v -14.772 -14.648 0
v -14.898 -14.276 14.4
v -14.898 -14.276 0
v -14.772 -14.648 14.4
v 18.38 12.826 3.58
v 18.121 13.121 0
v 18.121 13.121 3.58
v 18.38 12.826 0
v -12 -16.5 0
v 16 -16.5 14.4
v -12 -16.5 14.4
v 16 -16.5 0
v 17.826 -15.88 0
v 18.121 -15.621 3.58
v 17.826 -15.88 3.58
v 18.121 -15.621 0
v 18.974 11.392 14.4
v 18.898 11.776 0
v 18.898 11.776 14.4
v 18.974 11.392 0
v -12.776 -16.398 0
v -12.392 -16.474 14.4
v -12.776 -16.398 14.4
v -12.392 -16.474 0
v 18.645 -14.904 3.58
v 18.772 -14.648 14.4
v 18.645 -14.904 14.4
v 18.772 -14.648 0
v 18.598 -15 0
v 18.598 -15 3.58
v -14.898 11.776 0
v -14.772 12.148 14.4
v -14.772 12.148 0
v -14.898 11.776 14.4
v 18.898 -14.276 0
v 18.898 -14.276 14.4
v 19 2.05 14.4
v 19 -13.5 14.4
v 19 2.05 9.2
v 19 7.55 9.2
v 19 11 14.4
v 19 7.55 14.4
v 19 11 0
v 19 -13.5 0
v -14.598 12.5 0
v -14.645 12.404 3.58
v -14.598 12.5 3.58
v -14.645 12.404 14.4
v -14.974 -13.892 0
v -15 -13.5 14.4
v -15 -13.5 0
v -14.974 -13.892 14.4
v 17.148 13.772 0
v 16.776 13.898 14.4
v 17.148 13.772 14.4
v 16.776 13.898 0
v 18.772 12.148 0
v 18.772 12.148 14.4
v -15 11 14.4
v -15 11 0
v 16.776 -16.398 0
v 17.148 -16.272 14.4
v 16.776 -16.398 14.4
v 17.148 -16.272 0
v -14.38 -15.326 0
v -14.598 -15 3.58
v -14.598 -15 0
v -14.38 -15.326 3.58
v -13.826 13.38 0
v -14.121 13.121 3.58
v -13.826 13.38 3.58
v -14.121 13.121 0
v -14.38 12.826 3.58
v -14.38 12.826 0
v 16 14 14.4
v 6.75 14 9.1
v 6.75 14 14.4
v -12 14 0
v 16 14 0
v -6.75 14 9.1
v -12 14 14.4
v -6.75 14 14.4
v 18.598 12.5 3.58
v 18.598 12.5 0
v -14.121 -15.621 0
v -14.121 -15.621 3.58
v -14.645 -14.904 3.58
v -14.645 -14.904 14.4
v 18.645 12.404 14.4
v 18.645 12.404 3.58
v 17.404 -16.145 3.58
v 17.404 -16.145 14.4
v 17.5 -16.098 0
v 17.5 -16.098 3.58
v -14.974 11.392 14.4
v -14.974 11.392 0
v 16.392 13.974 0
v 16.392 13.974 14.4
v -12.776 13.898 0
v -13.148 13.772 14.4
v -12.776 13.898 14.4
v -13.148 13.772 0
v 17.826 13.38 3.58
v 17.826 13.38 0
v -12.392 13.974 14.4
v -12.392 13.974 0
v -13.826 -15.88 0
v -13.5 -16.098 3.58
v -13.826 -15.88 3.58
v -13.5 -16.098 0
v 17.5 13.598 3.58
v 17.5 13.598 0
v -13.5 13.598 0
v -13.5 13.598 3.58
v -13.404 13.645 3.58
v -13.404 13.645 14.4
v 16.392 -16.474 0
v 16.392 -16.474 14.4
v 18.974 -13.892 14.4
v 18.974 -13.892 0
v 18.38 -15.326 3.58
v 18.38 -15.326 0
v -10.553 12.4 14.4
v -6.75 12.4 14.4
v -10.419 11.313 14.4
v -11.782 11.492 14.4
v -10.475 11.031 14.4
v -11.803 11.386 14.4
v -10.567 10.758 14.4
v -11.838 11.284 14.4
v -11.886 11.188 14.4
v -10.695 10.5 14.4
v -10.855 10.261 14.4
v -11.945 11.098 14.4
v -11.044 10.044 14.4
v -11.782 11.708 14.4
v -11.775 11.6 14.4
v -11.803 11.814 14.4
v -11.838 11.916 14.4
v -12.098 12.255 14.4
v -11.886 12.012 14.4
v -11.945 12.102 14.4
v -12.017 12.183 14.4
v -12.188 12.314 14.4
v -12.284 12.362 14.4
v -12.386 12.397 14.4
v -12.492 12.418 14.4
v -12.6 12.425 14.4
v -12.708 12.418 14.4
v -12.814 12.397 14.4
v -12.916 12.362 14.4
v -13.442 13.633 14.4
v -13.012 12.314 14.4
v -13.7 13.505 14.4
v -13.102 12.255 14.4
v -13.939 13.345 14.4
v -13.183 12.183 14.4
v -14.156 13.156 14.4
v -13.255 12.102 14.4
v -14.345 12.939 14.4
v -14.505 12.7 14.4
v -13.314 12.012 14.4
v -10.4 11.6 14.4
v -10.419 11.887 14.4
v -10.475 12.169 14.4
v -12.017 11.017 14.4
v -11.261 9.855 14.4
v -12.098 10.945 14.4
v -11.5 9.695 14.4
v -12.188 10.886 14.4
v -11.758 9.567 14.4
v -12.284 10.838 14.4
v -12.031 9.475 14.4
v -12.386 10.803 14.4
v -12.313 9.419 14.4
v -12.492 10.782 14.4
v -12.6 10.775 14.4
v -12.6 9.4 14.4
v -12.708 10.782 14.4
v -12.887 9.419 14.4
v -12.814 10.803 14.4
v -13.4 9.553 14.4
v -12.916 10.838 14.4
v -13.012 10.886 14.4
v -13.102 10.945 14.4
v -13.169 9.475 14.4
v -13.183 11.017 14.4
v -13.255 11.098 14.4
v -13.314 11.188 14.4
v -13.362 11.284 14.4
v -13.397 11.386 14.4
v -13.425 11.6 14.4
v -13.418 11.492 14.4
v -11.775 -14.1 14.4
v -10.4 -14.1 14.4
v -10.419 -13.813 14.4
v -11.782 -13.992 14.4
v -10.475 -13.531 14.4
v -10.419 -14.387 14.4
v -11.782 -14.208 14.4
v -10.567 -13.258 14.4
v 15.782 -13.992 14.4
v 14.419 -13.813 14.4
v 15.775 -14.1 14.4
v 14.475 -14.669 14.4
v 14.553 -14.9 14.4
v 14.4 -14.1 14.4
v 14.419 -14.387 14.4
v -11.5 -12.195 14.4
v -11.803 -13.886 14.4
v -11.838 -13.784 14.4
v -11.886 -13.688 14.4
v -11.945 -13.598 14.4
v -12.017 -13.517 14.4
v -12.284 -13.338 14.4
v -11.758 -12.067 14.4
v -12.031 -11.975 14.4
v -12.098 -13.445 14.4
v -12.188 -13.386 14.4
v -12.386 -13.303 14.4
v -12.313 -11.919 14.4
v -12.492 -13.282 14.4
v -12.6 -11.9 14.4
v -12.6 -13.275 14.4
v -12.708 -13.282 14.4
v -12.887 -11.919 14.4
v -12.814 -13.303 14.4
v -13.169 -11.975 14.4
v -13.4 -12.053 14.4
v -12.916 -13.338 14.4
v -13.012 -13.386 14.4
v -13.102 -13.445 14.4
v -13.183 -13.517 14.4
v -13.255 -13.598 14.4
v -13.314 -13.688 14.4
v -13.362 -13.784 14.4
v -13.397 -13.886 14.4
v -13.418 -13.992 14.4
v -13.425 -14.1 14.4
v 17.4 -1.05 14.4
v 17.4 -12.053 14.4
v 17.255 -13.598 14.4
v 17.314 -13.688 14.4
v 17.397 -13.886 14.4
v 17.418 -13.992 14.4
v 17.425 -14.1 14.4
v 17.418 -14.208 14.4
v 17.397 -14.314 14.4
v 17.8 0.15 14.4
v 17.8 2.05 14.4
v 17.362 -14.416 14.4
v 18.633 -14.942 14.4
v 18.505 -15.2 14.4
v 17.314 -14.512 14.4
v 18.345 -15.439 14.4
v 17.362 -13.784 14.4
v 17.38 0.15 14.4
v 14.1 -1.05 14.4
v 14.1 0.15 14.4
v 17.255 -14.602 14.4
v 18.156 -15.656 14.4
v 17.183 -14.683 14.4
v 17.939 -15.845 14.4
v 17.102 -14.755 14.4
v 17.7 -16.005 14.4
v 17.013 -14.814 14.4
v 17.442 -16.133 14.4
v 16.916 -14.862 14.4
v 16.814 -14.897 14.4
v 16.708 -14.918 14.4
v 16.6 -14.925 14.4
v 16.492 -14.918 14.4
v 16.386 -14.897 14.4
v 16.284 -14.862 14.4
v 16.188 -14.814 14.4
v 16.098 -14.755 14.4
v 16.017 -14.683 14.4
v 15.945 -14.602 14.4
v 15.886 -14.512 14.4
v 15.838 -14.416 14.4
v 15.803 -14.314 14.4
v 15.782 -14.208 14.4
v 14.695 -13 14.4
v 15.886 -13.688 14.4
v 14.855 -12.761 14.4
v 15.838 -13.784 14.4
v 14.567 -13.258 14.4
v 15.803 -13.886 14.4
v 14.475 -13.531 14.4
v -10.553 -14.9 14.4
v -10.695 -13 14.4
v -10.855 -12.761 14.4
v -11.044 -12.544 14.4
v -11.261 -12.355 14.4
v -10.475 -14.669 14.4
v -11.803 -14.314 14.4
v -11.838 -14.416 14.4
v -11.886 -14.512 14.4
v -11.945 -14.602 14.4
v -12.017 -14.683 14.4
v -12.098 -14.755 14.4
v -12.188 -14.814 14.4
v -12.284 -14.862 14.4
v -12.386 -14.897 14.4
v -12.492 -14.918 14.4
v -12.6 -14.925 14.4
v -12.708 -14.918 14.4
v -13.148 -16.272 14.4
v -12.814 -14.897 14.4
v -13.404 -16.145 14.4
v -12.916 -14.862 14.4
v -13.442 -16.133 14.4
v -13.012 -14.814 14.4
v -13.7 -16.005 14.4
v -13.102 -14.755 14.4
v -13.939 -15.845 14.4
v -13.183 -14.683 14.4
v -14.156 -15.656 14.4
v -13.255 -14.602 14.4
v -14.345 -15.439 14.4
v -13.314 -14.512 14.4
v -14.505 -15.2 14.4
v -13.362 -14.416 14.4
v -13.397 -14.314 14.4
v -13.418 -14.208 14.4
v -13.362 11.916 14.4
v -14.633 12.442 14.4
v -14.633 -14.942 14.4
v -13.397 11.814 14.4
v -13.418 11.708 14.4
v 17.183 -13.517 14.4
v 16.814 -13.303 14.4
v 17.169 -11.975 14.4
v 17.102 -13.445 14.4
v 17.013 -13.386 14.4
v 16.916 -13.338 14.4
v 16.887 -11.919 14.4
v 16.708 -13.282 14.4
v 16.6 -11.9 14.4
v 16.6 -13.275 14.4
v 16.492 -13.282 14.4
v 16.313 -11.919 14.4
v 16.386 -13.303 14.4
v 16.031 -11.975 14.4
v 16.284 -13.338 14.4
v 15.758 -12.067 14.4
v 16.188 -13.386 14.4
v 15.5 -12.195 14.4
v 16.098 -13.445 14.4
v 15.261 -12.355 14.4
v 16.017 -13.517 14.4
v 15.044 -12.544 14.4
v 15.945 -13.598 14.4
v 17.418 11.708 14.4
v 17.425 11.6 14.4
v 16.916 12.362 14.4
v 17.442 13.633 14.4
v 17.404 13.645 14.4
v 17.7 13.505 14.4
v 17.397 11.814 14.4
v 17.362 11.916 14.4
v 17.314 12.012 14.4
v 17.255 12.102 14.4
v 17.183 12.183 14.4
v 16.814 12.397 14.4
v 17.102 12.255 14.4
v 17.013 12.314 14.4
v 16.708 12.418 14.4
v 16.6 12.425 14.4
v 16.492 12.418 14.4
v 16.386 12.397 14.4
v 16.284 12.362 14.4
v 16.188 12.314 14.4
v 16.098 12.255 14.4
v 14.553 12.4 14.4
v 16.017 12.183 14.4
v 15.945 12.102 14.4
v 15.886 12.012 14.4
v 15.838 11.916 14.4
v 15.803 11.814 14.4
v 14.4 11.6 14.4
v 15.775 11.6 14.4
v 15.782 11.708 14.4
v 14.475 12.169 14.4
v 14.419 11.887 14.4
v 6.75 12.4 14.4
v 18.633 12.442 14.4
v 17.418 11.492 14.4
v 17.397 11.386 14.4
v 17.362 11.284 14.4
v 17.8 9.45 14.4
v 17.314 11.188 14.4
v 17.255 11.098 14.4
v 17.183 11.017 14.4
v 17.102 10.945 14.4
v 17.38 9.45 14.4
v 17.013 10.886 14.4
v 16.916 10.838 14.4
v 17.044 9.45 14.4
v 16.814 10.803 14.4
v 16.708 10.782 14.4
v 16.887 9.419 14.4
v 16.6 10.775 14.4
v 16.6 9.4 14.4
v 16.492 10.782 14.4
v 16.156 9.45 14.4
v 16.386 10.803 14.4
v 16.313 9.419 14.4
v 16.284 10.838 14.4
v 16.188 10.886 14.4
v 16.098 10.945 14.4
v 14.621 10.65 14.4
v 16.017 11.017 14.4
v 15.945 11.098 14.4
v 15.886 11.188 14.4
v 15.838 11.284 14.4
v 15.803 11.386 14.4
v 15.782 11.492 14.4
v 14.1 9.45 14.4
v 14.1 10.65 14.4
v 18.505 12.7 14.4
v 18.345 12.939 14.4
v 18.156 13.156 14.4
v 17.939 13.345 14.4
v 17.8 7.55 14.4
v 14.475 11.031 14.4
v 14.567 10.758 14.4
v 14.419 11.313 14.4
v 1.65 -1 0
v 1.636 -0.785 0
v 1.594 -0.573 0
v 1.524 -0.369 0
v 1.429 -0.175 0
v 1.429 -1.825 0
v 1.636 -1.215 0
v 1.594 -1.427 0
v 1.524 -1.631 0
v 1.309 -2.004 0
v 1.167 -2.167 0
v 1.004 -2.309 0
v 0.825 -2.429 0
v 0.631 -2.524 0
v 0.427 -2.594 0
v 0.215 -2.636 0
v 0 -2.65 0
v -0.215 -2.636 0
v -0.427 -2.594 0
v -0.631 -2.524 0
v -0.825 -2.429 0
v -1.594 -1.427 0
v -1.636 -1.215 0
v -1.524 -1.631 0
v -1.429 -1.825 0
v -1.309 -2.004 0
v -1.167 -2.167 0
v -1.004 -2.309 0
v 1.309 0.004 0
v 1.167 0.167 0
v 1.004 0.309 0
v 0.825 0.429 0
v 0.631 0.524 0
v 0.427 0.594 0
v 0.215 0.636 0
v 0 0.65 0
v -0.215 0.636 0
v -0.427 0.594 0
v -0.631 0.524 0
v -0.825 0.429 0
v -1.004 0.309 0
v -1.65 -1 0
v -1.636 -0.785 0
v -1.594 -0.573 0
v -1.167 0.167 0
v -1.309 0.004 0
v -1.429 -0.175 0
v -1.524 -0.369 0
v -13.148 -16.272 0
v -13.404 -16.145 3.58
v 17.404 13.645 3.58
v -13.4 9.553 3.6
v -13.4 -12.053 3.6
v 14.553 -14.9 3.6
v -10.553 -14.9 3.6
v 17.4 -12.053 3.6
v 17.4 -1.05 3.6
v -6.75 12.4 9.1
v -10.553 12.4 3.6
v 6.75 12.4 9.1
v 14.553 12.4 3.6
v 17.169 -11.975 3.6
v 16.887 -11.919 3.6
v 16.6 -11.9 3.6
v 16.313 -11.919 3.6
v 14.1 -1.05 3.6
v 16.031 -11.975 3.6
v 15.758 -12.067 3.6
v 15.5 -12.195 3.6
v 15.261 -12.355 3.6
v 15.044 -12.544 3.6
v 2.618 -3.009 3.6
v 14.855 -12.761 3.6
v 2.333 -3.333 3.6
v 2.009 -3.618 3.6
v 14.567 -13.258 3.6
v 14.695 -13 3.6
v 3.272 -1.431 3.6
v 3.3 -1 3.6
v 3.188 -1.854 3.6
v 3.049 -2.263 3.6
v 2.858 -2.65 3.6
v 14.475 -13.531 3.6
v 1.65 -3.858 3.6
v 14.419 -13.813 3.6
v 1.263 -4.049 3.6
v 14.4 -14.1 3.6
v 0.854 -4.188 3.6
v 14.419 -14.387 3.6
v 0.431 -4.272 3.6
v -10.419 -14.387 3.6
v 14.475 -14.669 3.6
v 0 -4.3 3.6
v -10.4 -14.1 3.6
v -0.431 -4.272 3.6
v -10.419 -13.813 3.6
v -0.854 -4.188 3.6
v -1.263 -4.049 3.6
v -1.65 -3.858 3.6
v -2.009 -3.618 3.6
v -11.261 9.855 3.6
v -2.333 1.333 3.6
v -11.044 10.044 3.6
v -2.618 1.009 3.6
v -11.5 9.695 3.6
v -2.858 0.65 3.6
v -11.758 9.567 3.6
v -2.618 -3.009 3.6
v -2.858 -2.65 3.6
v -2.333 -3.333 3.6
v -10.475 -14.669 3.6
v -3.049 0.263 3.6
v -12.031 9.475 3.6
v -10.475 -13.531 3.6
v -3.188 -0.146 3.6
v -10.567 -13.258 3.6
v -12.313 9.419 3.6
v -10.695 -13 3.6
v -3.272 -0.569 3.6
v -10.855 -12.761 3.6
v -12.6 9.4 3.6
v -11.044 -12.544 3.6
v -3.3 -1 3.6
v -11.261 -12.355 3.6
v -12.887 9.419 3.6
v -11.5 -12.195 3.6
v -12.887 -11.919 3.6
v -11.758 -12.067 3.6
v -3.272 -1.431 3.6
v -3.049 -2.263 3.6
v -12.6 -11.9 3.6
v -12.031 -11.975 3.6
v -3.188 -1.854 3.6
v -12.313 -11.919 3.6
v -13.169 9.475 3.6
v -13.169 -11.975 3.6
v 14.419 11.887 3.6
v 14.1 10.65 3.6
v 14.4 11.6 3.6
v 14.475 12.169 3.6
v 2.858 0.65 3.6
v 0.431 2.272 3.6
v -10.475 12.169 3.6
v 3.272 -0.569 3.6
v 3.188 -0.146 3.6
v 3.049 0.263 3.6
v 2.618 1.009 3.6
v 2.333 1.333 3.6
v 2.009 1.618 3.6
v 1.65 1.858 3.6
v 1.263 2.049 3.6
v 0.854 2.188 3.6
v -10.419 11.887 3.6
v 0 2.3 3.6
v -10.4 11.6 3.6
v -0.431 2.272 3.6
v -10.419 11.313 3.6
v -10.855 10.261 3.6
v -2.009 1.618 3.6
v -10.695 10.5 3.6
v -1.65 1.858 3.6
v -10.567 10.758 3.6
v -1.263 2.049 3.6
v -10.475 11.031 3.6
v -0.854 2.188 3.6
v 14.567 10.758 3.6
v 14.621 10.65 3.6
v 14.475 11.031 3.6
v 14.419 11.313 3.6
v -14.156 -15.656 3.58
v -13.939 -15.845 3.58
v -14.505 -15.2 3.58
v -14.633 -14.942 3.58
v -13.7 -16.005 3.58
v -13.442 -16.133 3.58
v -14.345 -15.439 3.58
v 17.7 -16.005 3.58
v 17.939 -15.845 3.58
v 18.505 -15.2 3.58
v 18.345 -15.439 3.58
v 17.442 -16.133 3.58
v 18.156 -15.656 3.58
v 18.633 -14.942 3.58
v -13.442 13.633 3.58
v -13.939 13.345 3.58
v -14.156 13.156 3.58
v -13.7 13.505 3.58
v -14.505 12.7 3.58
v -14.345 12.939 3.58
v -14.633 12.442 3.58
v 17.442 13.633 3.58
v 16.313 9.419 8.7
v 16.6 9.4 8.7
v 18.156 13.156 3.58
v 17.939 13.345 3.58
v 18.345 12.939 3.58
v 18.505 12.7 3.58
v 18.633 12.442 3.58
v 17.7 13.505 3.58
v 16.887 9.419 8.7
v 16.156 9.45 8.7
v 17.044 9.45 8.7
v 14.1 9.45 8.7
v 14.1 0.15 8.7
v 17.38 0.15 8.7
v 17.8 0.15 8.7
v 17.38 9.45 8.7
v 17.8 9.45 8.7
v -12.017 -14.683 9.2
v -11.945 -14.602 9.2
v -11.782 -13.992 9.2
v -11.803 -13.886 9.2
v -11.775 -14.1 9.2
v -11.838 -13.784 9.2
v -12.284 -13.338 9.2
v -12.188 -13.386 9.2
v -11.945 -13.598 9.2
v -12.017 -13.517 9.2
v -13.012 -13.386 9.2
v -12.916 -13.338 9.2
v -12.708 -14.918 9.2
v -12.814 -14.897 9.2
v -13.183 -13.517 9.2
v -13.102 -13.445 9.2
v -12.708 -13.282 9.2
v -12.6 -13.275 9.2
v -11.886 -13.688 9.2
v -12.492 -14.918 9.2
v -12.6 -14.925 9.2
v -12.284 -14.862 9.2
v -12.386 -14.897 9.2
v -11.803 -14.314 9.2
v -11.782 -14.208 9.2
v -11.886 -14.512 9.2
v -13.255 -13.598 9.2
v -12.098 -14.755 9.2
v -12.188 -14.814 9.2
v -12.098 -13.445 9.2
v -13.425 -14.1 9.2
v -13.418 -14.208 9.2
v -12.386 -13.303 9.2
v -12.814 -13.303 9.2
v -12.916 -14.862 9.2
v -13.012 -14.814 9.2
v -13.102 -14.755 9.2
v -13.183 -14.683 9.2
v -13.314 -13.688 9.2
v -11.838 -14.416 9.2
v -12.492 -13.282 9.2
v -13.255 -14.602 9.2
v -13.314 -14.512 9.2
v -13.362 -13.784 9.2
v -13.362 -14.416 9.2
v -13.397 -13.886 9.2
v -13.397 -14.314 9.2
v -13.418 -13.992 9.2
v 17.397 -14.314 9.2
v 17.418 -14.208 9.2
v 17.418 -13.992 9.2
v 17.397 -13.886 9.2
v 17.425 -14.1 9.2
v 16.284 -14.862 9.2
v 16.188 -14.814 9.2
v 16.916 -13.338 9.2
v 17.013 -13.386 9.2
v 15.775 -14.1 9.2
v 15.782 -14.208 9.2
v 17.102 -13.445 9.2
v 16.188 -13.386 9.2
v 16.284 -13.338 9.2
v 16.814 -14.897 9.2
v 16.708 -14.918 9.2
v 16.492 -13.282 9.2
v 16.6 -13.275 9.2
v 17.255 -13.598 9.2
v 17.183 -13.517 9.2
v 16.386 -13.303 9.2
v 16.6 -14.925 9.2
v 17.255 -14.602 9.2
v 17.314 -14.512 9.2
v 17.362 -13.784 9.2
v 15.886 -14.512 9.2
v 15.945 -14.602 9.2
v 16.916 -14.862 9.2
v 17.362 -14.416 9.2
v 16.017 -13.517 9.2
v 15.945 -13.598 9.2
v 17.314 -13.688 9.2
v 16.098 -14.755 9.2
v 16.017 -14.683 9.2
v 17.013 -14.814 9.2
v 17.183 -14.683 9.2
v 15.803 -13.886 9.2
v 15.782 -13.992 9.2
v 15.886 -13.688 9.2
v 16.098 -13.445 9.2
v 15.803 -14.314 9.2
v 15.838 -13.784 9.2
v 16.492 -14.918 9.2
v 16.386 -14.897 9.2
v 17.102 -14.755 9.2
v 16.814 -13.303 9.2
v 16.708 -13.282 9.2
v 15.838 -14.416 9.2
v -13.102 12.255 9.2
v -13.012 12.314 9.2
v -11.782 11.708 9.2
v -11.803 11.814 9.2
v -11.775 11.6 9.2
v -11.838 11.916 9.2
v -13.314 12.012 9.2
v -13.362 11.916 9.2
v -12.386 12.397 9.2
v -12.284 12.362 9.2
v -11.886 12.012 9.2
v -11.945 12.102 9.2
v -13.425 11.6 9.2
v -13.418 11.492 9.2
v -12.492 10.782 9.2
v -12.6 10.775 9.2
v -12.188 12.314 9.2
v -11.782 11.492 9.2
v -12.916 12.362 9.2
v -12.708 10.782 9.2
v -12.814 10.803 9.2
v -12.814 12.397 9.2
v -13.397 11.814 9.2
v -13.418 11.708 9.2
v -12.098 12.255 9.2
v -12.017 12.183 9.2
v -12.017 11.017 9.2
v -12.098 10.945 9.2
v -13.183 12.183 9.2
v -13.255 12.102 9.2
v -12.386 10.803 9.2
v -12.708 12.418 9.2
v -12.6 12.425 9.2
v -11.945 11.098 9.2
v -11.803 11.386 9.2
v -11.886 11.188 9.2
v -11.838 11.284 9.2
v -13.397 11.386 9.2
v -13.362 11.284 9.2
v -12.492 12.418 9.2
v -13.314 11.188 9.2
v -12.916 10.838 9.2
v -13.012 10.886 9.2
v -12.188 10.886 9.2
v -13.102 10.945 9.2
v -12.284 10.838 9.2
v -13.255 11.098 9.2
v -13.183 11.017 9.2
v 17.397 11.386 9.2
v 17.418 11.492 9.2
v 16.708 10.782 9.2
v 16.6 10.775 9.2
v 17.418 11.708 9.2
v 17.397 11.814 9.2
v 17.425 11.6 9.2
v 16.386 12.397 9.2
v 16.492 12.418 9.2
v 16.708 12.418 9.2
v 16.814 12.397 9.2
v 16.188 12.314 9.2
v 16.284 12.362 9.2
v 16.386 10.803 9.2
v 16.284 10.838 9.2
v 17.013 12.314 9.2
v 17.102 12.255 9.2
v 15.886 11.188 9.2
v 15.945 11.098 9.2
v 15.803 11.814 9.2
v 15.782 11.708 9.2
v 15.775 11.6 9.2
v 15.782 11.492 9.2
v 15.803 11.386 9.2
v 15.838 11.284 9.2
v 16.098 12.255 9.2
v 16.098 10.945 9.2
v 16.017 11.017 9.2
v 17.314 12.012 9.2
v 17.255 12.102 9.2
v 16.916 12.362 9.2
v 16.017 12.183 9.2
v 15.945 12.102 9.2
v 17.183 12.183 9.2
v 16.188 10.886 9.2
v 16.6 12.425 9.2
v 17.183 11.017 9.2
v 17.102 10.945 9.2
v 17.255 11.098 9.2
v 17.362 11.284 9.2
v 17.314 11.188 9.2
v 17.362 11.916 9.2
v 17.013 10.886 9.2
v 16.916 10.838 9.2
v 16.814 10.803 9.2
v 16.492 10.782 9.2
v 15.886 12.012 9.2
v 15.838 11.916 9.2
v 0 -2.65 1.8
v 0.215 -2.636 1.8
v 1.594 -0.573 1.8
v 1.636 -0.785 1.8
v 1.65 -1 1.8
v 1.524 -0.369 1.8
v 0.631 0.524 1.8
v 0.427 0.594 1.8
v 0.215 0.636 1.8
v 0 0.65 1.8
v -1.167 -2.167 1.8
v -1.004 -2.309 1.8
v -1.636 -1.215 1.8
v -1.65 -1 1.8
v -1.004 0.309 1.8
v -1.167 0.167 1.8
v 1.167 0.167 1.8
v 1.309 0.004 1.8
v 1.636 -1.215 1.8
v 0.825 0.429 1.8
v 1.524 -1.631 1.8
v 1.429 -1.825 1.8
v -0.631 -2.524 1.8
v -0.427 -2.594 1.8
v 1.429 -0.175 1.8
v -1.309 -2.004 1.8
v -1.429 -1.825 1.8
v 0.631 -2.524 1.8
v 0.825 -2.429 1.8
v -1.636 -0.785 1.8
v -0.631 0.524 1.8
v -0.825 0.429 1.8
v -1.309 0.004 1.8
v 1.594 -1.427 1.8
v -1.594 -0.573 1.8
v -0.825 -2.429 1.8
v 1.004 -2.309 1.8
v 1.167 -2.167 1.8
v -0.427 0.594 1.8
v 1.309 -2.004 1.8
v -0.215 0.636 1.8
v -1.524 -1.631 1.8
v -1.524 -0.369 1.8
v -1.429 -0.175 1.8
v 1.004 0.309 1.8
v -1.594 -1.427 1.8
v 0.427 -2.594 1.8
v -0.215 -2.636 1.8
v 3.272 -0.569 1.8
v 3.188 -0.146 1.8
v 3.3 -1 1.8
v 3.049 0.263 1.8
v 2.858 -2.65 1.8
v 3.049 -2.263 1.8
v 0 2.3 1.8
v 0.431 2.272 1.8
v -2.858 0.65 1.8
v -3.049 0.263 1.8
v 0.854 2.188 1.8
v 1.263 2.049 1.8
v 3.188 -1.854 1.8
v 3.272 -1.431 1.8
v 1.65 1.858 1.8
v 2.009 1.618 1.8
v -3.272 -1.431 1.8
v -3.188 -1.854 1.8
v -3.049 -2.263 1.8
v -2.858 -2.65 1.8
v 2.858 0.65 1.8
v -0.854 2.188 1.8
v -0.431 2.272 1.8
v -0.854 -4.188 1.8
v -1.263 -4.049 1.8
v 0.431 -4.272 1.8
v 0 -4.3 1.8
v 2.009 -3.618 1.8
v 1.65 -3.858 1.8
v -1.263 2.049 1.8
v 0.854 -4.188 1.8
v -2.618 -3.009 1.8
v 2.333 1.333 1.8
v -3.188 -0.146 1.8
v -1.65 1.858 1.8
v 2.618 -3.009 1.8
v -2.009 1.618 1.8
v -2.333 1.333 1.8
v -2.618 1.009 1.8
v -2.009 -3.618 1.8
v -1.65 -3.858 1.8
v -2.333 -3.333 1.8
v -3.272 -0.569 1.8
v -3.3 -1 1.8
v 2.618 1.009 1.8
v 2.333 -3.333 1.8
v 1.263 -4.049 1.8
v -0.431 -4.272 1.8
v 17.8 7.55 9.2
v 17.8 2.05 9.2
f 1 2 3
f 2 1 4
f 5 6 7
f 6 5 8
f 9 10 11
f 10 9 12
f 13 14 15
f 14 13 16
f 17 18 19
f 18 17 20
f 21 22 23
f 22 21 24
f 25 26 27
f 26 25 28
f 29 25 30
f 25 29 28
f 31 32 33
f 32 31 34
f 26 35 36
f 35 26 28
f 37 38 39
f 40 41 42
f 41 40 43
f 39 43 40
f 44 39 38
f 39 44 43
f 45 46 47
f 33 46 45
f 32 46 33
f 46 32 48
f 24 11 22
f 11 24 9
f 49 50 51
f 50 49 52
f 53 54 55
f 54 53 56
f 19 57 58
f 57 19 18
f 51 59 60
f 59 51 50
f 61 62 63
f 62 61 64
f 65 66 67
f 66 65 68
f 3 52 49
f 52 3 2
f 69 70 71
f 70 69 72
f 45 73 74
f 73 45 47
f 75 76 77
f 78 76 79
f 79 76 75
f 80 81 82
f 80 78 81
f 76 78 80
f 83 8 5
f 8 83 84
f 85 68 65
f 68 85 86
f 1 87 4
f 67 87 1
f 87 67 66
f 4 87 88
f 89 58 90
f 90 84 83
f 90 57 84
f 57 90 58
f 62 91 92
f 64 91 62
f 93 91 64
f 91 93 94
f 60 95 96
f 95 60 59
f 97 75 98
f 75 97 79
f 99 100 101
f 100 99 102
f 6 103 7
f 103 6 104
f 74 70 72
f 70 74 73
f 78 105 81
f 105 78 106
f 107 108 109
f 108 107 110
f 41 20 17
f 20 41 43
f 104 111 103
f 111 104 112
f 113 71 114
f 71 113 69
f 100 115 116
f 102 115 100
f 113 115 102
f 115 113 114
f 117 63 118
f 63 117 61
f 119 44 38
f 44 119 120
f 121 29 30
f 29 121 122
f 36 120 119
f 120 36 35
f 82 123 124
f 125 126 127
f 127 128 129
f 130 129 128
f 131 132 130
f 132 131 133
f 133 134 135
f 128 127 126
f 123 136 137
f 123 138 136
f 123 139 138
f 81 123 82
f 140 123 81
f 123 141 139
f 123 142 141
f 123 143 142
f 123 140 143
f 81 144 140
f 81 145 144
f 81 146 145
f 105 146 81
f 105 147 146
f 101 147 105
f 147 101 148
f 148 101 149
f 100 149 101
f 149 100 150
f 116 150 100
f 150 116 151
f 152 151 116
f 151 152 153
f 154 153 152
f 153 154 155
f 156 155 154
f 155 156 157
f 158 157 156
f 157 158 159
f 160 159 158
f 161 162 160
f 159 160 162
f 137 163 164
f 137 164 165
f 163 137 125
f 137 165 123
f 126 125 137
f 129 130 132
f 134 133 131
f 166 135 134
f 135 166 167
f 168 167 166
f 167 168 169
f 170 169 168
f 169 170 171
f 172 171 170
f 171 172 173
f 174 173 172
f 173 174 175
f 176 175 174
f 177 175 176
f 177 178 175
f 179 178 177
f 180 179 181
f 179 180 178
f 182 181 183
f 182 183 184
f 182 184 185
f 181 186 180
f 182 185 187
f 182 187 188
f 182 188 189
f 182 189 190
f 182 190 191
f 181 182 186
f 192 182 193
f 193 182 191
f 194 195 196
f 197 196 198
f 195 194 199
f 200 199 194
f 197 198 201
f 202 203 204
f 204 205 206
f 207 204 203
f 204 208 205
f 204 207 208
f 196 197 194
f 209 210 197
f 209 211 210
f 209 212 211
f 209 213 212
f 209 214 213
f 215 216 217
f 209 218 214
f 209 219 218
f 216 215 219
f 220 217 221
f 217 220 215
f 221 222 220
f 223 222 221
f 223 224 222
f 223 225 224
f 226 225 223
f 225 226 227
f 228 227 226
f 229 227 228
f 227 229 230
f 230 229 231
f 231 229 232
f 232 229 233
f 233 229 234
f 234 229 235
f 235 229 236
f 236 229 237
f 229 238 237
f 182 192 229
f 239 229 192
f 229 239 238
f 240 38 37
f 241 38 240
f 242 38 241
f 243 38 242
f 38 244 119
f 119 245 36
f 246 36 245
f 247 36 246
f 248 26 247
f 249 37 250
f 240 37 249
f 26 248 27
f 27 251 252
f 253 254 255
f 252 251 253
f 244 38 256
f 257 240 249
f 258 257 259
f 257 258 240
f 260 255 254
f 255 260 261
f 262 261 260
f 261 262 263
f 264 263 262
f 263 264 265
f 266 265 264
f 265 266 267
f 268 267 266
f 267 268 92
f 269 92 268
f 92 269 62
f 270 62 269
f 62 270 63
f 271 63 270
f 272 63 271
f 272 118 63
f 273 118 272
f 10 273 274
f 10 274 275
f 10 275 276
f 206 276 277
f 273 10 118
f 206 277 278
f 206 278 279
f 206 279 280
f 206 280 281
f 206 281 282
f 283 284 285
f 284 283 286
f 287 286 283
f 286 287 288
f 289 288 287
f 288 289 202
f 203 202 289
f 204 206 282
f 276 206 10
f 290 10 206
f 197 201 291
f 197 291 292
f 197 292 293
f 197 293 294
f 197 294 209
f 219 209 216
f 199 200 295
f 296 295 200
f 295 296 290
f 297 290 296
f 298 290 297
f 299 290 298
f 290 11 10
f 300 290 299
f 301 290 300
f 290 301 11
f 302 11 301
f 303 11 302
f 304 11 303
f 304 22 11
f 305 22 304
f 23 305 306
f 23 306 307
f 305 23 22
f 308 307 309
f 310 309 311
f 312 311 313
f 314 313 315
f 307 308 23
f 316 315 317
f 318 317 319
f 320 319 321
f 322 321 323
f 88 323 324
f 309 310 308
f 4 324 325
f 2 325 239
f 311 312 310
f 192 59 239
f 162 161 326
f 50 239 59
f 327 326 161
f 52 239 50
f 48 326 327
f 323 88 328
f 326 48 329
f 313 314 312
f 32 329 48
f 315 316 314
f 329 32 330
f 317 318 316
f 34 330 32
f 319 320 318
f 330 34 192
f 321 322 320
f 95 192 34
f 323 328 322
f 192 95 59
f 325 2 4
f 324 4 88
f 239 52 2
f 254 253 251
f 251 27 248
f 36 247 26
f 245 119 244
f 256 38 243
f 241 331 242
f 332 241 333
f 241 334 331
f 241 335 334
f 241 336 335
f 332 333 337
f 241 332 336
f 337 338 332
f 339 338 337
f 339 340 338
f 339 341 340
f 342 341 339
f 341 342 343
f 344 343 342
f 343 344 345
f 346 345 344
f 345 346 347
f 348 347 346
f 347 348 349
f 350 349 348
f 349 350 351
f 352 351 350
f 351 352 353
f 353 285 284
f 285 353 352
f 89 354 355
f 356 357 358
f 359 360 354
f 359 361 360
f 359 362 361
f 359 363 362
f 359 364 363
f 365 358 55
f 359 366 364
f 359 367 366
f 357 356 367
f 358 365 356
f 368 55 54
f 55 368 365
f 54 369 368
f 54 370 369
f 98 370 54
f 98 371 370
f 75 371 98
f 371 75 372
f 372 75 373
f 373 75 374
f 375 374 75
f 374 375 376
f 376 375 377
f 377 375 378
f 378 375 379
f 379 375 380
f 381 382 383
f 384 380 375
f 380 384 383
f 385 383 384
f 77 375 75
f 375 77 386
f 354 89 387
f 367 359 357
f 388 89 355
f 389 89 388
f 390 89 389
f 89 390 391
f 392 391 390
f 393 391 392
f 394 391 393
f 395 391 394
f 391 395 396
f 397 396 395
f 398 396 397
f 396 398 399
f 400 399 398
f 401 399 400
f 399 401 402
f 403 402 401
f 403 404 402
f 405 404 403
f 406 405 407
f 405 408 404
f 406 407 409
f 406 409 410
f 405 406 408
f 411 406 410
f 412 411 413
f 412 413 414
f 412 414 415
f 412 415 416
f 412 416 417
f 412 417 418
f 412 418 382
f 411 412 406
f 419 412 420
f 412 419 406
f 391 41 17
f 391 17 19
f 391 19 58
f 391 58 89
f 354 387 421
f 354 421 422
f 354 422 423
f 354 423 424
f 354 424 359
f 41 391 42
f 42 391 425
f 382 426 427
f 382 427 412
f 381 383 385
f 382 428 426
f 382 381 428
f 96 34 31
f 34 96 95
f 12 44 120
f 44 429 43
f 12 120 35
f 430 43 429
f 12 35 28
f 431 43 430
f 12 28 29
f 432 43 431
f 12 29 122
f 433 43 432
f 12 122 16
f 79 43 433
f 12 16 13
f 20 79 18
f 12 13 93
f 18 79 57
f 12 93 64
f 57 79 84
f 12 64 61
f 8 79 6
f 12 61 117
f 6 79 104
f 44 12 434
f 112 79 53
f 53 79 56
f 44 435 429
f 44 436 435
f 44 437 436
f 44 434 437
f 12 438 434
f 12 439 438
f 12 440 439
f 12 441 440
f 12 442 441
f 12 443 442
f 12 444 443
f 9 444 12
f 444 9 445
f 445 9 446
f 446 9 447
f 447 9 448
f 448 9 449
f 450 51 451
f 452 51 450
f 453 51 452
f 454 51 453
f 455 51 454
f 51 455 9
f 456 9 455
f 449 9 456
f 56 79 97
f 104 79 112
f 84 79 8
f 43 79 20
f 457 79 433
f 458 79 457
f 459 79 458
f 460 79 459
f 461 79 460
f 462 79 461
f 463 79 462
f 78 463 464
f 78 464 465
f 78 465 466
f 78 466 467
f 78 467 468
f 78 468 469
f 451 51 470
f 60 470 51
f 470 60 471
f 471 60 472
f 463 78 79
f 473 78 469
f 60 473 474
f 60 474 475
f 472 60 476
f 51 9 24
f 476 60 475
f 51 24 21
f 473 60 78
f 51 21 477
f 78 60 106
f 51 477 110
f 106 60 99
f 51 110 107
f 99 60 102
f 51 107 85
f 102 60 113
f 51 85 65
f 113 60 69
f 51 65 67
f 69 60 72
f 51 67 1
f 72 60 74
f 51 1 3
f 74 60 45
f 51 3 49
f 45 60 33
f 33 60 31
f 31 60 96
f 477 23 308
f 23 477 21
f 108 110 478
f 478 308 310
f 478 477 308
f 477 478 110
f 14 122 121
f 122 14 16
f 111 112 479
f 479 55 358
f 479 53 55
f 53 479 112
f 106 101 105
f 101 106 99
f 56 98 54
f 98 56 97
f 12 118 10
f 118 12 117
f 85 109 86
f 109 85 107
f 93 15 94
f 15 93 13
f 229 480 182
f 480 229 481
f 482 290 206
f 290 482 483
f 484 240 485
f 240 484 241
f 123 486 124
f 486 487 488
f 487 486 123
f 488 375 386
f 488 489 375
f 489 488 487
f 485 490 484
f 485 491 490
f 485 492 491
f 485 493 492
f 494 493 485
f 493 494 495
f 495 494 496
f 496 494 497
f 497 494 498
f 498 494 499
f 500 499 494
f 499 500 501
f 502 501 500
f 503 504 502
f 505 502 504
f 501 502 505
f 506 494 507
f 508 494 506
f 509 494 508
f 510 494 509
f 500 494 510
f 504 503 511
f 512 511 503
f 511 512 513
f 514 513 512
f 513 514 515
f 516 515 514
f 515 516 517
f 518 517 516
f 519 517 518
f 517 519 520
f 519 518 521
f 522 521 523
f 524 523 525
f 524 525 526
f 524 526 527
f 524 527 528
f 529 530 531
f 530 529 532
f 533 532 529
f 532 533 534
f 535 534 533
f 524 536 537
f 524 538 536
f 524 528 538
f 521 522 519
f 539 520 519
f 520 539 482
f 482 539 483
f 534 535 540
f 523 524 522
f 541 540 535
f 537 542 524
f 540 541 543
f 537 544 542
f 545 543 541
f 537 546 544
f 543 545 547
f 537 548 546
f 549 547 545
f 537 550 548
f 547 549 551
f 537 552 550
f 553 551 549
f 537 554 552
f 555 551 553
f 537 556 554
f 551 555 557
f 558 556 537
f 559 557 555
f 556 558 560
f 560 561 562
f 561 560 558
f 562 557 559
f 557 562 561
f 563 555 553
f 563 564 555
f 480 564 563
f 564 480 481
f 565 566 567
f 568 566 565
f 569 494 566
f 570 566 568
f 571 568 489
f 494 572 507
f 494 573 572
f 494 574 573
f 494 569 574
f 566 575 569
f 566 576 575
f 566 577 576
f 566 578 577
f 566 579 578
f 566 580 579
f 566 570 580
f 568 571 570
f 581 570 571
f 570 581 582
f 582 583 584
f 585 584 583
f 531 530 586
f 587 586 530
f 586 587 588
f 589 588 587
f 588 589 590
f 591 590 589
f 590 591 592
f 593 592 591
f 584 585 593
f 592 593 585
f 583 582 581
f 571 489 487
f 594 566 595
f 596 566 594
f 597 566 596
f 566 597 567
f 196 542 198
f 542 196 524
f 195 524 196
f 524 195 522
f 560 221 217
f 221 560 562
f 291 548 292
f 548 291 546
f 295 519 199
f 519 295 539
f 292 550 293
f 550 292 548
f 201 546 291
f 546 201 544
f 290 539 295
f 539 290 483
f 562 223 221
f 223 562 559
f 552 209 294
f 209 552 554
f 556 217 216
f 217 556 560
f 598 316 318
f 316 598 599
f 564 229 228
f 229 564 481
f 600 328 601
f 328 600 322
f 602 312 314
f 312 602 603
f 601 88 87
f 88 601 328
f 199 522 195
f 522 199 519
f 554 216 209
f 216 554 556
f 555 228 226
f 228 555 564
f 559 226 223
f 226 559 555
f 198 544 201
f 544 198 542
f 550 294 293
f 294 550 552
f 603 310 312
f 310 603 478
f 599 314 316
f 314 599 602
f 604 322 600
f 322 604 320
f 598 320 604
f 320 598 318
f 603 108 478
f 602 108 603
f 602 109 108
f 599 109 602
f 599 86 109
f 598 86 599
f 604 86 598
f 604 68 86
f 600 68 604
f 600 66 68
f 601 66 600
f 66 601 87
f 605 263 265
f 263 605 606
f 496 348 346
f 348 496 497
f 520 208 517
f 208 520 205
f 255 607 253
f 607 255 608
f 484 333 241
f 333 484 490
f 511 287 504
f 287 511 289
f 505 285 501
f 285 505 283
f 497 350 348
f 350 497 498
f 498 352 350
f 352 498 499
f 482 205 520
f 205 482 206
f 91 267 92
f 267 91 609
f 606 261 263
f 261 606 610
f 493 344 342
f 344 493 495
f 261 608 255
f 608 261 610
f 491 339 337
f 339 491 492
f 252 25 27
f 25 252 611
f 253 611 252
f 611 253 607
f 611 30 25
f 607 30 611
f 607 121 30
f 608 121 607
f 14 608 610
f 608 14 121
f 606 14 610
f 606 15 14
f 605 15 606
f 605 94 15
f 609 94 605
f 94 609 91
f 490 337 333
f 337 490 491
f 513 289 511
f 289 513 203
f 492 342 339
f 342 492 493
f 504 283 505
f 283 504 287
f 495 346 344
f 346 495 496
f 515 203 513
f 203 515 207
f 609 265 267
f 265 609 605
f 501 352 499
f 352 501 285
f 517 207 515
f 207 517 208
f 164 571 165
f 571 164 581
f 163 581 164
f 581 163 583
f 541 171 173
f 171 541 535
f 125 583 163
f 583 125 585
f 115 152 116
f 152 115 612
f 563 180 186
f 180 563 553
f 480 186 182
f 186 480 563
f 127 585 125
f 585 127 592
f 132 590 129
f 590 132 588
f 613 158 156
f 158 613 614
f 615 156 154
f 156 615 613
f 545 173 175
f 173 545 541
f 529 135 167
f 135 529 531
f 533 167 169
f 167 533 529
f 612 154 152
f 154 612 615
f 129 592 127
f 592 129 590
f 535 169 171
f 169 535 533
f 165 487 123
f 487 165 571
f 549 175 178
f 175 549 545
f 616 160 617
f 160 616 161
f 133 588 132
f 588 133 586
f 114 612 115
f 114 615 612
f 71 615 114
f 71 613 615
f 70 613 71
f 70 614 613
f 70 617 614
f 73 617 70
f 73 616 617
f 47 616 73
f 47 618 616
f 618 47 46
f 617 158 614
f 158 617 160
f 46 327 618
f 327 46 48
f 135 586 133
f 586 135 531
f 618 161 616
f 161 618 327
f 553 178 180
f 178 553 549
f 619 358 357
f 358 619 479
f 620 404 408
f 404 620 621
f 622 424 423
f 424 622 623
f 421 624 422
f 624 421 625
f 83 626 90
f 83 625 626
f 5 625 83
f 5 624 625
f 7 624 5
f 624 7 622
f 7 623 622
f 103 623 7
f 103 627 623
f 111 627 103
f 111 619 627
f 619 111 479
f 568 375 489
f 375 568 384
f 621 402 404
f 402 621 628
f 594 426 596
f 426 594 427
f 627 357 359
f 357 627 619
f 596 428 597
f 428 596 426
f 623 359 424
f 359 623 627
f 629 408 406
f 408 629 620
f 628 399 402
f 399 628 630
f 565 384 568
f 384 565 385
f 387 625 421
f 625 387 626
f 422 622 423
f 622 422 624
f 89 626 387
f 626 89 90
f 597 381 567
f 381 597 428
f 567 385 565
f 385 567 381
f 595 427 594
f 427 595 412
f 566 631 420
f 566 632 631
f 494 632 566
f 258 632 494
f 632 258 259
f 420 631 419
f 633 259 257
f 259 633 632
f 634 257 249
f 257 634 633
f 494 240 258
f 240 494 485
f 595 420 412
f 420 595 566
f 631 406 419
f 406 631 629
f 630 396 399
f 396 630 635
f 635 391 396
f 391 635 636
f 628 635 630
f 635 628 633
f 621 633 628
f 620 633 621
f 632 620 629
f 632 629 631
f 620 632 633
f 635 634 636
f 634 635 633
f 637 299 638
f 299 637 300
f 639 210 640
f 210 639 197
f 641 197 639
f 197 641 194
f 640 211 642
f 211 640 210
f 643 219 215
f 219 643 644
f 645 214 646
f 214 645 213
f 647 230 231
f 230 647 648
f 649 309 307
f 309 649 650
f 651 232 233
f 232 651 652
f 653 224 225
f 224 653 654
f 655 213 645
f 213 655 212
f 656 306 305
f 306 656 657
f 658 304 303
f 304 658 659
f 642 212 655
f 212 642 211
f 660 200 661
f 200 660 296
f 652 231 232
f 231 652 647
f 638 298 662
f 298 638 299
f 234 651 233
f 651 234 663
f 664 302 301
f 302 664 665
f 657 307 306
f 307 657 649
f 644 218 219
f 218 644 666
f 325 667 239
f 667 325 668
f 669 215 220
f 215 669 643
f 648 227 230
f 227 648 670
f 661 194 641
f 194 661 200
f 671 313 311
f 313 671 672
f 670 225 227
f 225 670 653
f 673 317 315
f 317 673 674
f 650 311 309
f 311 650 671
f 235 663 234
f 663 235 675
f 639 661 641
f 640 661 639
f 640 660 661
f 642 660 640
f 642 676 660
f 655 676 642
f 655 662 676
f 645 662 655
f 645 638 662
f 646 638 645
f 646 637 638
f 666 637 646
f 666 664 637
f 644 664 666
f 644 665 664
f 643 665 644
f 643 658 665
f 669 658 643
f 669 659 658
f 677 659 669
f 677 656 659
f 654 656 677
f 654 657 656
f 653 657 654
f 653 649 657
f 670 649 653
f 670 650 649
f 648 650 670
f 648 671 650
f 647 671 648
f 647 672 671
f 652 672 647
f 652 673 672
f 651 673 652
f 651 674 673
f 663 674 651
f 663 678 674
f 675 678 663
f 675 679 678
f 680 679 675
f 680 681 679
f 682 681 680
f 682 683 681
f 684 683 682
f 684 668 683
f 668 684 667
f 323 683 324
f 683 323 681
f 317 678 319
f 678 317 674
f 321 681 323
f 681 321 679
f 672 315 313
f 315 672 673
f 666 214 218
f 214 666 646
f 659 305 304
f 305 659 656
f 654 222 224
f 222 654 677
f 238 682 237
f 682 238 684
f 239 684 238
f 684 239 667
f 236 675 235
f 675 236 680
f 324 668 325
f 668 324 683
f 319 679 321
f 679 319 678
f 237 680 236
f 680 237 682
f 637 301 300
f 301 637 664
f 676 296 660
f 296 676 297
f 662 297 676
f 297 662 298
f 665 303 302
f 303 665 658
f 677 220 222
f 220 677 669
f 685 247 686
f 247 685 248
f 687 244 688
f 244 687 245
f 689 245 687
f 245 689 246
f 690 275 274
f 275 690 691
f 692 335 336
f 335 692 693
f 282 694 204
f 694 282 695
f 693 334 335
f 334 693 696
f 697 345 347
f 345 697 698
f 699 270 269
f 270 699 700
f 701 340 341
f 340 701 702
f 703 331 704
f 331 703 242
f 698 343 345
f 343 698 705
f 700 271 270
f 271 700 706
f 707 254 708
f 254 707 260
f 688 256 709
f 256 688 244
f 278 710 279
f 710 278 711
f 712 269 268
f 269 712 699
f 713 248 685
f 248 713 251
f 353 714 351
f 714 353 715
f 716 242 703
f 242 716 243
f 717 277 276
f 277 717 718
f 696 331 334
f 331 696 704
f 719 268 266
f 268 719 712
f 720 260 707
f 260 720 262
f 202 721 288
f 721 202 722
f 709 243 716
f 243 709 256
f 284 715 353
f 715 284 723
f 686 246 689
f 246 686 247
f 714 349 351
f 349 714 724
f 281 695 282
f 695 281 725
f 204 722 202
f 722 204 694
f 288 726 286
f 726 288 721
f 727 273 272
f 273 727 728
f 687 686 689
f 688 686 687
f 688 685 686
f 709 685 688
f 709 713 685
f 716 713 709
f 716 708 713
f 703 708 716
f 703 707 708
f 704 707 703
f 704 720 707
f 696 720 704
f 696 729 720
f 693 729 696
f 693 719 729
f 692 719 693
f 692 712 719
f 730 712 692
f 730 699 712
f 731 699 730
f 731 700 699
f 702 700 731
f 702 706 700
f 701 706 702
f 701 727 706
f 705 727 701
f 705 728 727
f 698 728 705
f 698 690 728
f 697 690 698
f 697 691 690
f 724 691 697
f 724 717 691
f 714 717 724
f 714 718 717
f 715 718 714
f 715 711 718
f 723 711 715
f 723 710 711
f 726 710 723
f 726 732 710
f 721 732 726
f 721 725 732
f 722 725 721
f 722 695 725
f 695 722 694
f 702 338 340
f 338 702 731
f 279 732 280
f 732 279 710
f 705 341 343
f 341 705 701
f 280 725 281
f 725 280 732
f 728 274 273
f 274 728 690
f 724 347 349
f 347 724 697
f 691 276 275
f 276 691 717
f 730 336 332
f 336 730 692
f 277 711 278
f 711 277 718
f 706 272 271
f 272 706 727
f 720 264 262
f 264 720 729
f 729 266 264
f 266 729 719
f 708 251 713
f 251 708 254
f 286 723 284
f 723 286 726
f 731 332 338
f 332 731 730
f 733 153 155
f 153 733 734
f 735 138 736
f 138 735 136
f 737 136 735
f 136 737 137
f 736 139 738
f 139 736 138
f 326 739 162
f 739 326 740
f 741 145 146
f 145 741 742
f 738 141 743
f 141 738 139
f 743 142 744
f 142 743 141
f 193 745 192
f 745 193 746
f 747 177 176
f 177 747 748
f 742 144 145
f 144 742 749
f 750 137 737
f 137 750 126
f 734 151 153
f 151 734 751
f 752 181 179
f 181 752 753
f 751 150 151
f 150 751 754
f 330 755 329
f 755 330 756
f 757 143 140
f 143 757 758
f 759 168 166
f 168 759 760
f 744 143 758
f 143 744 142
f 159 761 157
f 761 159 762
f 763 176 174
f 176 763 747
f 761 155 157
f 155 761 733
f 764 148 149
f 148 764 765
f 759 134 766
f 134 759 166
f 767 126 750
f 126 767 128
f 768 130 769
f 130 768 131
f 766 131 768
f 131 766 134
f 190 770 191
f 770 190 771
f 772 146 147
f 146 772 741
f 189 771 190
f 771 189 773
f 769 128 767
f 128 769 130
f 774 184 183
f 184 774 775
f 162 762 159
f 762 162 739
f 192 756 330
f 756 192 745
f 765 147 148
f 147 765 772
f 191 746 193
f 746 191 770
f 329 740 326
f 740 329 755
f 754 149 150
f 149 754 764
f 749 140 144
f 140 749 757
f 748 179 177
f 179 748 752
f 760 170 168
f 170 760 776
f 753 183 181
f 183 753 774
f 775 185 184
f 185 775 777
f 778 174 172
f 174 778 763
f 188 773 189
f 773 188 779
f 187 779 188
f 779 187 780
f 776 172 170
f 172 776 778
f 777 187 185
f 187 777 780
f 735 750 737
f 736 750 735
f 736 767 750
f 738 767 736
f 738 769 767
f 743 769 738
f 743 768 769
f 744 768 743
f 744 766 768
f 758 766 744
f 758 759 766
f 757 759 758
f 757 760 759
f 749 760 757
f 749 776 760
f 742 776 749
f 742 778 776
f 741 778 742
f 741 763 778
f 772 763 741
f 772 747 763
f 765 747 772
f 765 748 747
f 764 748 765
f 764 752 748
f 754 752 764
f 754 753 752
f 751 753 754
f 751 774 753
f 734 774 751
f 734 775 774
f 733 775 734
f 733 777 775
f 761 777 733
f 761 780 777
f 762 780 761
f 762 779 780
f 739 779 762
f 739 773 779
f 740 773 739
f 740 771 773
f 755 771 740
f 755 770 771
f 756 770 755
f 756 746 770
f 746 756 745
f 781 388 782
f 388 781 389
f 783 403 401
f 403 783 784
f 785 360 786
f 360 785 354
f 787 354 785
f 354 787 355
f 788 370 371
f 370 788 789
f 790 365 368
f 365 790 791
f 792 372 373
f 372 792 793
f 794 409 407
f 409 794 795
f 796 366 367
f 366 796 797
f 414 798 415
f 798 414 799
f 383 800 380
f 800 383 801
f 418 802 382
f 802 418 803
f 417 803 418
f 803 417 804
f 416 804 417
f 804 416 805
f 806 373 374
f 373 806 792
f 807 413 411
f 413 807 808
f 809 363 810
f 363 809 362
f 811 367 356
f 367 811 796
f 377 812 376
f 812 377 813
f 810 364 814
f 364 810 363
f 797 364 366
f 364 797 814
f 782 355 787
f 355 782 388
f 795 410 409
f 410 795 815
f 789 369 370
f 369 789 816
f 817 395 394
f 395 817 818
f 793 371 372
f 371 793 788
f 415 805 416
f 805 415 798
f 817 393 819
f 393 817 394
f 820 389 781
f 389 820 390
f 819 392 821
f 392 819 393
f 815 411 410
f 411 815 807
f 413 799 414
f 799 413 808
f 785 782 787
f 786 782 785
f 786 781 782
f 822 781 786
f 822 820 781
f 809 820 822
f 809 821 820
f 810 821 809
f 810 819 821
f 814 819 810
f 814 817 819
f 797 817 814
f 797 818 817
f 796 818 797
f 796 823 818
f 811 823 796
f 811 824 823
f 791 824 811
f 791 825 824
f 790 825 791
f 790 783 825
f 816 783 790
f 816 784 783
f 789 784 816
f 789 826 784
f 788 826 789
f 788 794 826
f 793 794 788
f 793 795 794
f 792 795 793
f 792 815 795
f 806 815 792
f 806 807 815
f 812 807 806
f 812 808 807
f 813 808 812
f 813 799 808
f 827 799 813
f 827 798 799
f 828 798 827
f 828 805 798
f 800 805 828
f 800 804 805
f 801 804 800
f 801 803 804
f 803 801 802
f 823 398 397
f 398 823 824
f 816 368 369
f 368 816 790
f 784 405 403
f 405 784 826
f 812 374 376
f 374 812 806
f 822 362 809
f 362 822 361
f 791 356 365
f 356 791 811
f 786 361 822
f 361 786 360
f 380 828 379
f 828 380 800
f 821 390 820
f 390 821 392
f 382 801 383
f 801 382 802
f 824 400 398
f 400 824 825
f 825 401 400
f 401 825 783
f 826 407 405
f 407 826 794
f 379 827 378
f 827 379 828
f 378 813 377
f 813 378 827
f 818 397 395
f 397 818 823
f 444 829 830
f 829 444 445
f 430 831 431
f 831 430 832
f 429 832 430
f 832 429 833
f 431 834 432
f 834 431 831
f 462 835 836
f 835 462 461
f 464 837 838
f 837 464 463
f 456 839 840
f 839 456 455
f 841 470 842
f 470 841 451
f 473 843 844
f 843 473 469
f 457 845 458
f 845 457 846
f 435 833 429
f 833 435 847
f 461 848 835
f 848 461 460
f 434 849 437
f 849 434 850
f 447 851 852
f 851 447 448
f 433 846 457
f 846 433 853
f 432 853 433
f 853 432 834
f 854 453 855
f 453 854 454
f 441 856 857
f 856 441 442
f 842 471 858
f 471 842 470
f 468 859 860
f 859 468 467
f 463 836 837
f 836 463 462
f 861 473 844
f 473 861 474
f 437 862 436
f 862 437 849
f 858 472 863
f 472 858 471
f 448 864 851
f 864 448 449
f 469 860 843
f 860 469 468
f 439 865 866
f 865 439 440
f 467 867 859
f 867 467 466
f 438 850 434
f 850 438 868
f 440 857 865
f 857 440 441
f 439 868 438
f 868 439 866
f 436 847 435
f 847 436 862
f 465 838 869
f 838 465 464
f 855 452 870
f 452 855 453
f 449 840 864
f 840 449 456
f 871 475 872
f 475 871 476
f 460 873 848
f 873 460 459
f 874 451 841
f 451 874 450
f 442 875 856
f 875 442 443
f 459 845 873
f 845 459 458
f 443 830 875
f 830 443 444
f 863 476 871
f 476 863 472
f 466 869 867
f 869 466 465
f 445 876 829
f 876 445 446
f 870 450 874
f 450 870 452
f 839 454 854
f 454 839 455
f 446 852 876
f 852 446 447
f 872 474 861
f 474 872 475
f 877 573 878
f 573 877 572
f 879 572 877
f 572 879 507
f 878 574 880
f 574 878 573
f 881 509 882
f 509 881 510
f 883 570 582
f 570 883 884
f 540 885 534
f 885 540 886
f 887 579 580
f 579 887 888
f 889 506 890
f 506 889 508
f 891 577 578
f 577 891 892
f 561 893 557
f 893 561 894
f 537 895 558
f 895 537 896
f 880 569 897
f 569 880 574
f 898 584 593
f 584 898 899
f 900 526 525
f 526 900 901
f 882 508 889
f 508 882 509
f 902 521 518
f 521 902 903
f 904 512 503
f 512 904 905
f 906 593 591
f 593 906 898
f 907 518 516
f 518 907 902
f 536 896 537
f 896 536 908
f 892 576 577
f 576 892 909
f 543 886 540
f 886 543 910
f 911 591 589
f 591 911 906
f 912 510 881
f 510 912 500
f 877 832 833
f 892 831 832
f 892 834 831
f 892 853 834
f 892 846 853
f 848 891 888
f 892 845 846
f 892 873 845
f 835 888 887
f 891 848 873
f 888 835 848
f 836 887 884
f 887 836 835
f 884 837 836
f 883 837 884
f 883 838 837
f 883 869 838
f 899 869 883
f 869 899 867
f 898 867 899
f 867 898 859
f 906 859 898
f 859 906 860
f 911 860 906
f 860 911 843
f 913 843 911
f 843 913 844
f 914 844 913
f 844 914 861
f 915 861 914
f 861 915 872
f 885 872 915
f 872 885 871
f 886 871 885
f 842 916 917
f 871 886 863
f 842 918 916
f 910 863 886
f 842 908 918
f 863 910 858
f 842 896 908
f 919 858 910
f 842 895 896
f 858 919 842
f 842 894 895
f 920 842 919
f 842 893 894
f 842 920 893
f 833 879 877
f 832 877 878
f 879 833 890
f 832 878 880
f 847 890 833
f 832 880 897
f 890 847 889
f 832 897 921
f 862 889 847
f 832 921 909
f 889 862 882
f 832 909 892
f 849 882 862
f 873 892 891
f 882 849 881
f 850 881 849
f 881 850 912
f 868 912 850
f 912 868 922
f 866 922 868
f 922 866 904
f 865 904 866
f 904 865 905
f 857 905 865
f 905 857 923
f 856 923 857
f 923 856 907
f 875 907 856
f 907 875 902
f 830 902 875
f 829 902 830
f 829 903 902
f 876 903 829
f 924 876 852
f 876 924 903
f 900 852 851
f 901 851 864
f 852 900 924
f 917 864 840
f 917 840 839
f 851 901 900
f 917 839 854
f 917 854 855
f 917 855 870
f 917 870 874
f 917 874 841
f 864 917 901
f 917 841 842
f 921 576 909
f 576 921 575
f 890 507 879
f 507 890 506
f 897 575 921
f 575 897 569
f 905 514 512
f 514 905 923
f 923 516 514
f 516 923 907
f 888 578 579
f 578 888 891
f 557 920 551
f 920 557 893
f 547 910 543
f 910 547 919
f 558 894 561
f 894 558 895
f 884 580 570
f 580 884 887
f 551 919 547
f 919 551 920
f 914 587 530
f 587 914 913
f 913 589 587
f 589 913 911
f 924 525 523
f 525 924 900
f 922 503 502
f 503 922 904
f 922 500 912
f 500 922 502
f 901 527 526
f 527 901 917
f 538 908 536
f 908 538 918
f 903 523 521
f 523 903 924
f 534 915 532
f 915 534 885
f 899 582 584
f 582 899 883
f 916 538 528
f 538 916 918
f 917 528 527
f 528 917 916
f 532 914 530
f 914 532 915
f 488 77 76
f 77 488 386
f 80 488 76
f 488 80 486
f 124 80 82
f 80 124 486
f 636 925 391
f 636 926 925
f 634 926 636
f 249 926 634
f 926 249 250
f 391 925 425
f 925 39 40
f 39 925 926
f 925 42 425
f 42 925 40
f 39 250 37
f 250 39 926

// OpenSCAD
// MotionLink HW-02 prototype. Dimensions in mm. Each part is oriented for printing.
part = "tray"; // [tray,lid,gauges,mount,smooth_mount]

// Grip and replaceable mount
plug_major = 3.1;
plug_minor = 2.65;
plug_length = 4;
plug_pitch = 1.2;
smooth_diameter = 3.4;
seat_diameter = 20;
seat_dish = 0.9;
mount_center = [0, -1];

// The USB end is +Y. The switch is on +X. The battery sits below the PCB.
left = -15;
right = 19;
back = -16.5;
front = 14;
wall = 1.6;
floor_height = 3.6;
rim = 14.4;
lid_height = 1.8;
corner = 3;

usb_x = 0;
usb_width = 13.5;
usb_bottom = 9.1;
switch_y = 4.8;
switch_shelf = 8.7;
switch_pocket_length = 9.3;
switch_wall = 1.2;

$fn = 48;
eps = 0.02;
boss_centers = [
    [left + 2.4, back + 2.4], [right - 2.4, back + 2.4],
    [left + 2.4, front - 2.4], [right - 2.4, front - 2.4]
];

module outline(inset = 0) {
    hull()
        for (x = [left + corner, right - corner],
             y = [back + corner, front - corner])
            translate([x, y]) circle(r = corner - inset);
}

module screw_holes(diameter, bottom, height) {
    for (p = boss_centers)
        translate([p[0], p[1], bottom])
            cylinder(d = diameter, h = height);
}

module switch_cradle() {
    cradle_x = right - switch_wall - 3.7;
    cradle_y = switch_y - switch_pocket_length / 2;
    translate([cradle_x, cradle_y, floor_height - eps])
        cube([right - cradle_x - 0.3, switch_pocket_length,
              switch_shelf - floor_height + eps]);
    for (y = [cradle_y - 1.2, cradle_y + switch_pocket_length])
        translate([cradle_x, y, floor_height - eps])
            cube([right - cradle_x - 0.3, 1.2, rim - floor_height + eps]);
}

module tray() {
    difference() {
        union() {
            difference() {
                linear_extrude(rim) outline();
                translate([0, 0, floor_height])
                    linear_extrude(rim) outline(wall);
            }
            for (p = boss_centers)
                translate([p[0], p[1], floor_height - eps])
                    cylinder(d = 4.4, h = rim - floor_height + eps);
            switch_cradle();
        }
        screw_holes(1.65, rim - 5.2, 5.2 + eps);
        // Open-top notches let the prewired assembly drop in from above.
        translate([usb_x - usb_width / 2, front - wall - eps, usb_bottom])
            cube([usb_width, wall + 2 * eps, rim - usb_bottom + eps]);
        // Recess the inner wall to place the switch face close to its actuator opening.
        translate([right - wall - eps, switch_y - switch_pocket_length / 2, switch_shelf])
            cube([wall - switch_wall + eps, switch_pocket_length, rim - switch_shelf + eps]);
        translate([right - switch_wall - eps, switch_y - 2.75, switch_shelf + 0.5])
            cube([switch_wall + 2 * eps, 5.5, rim - switch_shelf - 0.5 + eps]);
        translate([mount_center[0], mount_center[1], -eps]) {
            cylinder(d = 3.3, h = floor_height + 2 * eps);
            translate([0, 0, 1.8 + eps])
                cylinder(d = 6.6, h = floor_height - 1.8 + eps);
        }
    }
}

module lid() {
    // The visible face prints on the bed. Flip the lid over for assembly.
    difference() {
        union() {
            linear_extrude(lid_height) outline();
            // Capture the metal switch body vertically.
            translate([right - switch_wall - 3.5,
                       switch_y - switch_pocket_length / 2 + 0.35, lid_height - eps])
                cube([3.2, switch_pocket_length - 0.7, rim - switch_shelf - 3.9 + eps]);
        }
        screw_holes(2.25, -eps, lid_height + 2 * eps);
    }
}

module smooth_pin(diameter) {
    translate([0, 0, -eps])
        cylinder(d = diameter, h = plug_length - 0.6 + eps);
    translate([0, 0, plug_length - 0.6 - eps])
        cylinder(d1 = diameter, d2 = diameter - 0.8, h = 0.6 + eps);
}

module gauge(diameter) {
    union() {
        cylinder(d = 14, h = 2.4);
        translate([0, 0, 2.4]) smooth_pin(diameter);
        translate([0, -3.9, 2.4 - eps])
            linear_extrude(0.42)
                text(str(diameter), size = 2.7, font = "Liberation Sans",
                     halign = "center", valign = "center");
    }
}

// Sample a rounded, single-start thread directly on a tapered core. The
// crest fades at both ends so it starts smoothly and clears the grip face.
module grip_thread() {
    sides = 48;
    slices = ceil(plug_length * 30);
    points = [
        for (i = [0 : slices], j = [0 : sides - 1])
            let(z = plug_length * i / slices,
                angle = 360 * j / sides,
                turns = z / plug_pitch - angle / 360,
                phase = abs(turns - floor(turns + 0.5)),
                crest = (1 + cos(180 * min(phase / 0.4, 1))) / 2,
                fade = min(z / 0.55, (plug_length - z) / 0.85, 1),
                nose = max(0, (z - plug_length + 0.7) / 0.7) * 0.42,
                r = plug_minor / 2 + (plug_major - plug_minor) / 2 * crest * fade - nose)
            [r * cos(angle), r * sin(angle), z]
    ];
    faces = concat(
        [[for (j = [0 : sides - 1]) j]],
        [for (i = [0 : slices - 1], j = [0 : sides - 1])
            let(a = i * sides + j, b = i * sides + (j + 1) % sides,
                c = a + sides, d = b + sides)
            each [[a, c, b], [b, c, d]]],
        [[for (j = [sides - 1 : -1 : 0]) slices * sides + j]]
    );
    polyhedron(points, faces, convexity = 8);
}

module mount(threaded) {
    seat_height = 5.6;
    center_height = seat_height - seat_dish;
    union() {
        difference() {
            rotate_extrude()
                polygon([[0, 0], [seat_diameter / 2 - 0.5, 0],
                         [seat_diameter / 2, 0.5], [seat_diameter / 2, seat_height - 0.35],
                         [seat_diameter / 2 - 0.35, seat_height], [0, center_height]]);
            // M3 nut, nominal 5.5 mm across flats, inserted from the case side.
            translate([0, 0, -eps]) cylinder(d = 6.65, h = 2.8 + eps, $fn = 6);
            translate([0, 0, -eps]) cylinder(d = 3.4, h = 4.0 + eps);
        }
        if (threaded)
            translate([0, 0, center_height - eps]) grip_thread();
        else
            translate([0, 0, center_height]) smooth_pin(smooth_diameter);
    }
}

if (part == "tray") tray();
else if (part == "lid") mirror([0, 1, 0]) lid();
else if (part == "mount") mount(threaded = true);
else if (part == "smooth_mount") mount(threaded = false);
else if (part == "gauges")
    for (i = [0 : 4]) translate([17 * (i - 2), 0, 0]) gauge(2.6 + 0.2 * i);
